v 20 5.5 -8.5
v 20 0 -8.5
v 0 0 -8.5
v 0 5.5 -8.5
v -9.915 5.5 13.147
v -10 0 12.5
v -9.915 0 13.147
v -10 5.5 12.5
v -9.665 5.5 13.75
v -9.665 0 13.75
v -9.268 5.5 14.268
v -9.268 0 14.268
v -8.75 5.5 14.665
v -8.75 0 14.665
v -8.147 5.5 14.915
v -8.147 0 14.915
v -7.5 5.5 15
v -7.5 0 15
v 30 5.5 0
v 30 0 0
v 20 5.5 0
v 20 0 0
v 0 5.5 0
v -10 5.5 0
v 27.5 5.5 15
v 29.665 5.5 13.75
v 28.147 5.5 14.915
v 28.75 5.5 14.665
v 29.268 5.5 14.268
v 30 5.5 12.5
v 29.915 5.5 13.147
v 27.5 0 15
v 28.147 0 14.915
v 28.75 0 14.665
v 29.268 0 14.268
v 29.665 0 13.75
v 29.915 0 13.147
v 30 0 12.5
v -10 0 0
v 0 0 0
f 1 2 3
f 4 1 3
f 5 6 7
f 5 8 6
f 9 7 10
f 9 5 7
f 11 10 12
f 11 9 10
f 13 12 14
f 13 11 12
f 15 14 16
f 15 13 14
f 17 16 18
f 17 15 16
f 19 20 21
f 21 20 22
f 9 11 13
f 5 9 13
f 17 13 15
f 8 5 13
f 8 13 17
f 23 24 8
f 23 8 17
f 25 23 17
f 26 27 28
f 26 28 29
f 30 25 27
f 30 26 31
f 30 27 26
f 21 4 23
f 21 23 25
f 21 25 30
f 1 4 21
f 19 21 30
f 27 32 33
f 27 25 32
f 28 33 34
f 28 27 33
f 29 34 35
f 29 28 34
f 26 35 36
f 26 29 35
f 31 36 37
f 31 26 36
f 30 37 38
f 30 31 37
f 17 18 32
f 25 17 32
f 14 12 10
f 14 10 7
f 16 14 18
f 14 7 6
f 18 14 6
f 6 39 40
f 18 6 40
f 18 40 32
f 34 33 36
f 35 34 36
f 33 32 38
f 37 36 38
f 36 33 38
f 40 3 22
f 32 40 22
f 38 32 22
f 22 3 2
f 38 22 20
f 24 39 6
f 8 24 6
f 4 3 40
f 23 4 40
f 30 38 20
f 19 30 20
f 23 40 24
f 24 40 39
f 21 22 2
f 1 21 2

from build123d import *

# Parameters (mm, degrees)
BOSS_EXTRUDE1_DEPTH = 5.5
FILLET1_R           = 2.5


with BuildPart() as part:
    # Sketch1 → Boss-Extrude1 (new body)
    with BuildSketch(Plane(origin=(0, 0, 0), x_dir=(1, 0, 0), z_dir=(0, 1, 0))):
        Polygon((0, 0), (-10, 0), (-10, -15), (30, -15), (30, 0), (20, 0), (20, 8.5), (0, 8.5), align=None)
    extrude(amount=BOSS_EXTRUDE1_DEPTH)

    # Fillet1
    fillet1_edges = [part.edges().sort_by_distance(p)[0] for p in [
        (30, 2.75, 15),
        (-10, 2.75, 15),
    ]]
    fillet(fillet1_edges, radius=FILLET1_R)


solid = part.part
